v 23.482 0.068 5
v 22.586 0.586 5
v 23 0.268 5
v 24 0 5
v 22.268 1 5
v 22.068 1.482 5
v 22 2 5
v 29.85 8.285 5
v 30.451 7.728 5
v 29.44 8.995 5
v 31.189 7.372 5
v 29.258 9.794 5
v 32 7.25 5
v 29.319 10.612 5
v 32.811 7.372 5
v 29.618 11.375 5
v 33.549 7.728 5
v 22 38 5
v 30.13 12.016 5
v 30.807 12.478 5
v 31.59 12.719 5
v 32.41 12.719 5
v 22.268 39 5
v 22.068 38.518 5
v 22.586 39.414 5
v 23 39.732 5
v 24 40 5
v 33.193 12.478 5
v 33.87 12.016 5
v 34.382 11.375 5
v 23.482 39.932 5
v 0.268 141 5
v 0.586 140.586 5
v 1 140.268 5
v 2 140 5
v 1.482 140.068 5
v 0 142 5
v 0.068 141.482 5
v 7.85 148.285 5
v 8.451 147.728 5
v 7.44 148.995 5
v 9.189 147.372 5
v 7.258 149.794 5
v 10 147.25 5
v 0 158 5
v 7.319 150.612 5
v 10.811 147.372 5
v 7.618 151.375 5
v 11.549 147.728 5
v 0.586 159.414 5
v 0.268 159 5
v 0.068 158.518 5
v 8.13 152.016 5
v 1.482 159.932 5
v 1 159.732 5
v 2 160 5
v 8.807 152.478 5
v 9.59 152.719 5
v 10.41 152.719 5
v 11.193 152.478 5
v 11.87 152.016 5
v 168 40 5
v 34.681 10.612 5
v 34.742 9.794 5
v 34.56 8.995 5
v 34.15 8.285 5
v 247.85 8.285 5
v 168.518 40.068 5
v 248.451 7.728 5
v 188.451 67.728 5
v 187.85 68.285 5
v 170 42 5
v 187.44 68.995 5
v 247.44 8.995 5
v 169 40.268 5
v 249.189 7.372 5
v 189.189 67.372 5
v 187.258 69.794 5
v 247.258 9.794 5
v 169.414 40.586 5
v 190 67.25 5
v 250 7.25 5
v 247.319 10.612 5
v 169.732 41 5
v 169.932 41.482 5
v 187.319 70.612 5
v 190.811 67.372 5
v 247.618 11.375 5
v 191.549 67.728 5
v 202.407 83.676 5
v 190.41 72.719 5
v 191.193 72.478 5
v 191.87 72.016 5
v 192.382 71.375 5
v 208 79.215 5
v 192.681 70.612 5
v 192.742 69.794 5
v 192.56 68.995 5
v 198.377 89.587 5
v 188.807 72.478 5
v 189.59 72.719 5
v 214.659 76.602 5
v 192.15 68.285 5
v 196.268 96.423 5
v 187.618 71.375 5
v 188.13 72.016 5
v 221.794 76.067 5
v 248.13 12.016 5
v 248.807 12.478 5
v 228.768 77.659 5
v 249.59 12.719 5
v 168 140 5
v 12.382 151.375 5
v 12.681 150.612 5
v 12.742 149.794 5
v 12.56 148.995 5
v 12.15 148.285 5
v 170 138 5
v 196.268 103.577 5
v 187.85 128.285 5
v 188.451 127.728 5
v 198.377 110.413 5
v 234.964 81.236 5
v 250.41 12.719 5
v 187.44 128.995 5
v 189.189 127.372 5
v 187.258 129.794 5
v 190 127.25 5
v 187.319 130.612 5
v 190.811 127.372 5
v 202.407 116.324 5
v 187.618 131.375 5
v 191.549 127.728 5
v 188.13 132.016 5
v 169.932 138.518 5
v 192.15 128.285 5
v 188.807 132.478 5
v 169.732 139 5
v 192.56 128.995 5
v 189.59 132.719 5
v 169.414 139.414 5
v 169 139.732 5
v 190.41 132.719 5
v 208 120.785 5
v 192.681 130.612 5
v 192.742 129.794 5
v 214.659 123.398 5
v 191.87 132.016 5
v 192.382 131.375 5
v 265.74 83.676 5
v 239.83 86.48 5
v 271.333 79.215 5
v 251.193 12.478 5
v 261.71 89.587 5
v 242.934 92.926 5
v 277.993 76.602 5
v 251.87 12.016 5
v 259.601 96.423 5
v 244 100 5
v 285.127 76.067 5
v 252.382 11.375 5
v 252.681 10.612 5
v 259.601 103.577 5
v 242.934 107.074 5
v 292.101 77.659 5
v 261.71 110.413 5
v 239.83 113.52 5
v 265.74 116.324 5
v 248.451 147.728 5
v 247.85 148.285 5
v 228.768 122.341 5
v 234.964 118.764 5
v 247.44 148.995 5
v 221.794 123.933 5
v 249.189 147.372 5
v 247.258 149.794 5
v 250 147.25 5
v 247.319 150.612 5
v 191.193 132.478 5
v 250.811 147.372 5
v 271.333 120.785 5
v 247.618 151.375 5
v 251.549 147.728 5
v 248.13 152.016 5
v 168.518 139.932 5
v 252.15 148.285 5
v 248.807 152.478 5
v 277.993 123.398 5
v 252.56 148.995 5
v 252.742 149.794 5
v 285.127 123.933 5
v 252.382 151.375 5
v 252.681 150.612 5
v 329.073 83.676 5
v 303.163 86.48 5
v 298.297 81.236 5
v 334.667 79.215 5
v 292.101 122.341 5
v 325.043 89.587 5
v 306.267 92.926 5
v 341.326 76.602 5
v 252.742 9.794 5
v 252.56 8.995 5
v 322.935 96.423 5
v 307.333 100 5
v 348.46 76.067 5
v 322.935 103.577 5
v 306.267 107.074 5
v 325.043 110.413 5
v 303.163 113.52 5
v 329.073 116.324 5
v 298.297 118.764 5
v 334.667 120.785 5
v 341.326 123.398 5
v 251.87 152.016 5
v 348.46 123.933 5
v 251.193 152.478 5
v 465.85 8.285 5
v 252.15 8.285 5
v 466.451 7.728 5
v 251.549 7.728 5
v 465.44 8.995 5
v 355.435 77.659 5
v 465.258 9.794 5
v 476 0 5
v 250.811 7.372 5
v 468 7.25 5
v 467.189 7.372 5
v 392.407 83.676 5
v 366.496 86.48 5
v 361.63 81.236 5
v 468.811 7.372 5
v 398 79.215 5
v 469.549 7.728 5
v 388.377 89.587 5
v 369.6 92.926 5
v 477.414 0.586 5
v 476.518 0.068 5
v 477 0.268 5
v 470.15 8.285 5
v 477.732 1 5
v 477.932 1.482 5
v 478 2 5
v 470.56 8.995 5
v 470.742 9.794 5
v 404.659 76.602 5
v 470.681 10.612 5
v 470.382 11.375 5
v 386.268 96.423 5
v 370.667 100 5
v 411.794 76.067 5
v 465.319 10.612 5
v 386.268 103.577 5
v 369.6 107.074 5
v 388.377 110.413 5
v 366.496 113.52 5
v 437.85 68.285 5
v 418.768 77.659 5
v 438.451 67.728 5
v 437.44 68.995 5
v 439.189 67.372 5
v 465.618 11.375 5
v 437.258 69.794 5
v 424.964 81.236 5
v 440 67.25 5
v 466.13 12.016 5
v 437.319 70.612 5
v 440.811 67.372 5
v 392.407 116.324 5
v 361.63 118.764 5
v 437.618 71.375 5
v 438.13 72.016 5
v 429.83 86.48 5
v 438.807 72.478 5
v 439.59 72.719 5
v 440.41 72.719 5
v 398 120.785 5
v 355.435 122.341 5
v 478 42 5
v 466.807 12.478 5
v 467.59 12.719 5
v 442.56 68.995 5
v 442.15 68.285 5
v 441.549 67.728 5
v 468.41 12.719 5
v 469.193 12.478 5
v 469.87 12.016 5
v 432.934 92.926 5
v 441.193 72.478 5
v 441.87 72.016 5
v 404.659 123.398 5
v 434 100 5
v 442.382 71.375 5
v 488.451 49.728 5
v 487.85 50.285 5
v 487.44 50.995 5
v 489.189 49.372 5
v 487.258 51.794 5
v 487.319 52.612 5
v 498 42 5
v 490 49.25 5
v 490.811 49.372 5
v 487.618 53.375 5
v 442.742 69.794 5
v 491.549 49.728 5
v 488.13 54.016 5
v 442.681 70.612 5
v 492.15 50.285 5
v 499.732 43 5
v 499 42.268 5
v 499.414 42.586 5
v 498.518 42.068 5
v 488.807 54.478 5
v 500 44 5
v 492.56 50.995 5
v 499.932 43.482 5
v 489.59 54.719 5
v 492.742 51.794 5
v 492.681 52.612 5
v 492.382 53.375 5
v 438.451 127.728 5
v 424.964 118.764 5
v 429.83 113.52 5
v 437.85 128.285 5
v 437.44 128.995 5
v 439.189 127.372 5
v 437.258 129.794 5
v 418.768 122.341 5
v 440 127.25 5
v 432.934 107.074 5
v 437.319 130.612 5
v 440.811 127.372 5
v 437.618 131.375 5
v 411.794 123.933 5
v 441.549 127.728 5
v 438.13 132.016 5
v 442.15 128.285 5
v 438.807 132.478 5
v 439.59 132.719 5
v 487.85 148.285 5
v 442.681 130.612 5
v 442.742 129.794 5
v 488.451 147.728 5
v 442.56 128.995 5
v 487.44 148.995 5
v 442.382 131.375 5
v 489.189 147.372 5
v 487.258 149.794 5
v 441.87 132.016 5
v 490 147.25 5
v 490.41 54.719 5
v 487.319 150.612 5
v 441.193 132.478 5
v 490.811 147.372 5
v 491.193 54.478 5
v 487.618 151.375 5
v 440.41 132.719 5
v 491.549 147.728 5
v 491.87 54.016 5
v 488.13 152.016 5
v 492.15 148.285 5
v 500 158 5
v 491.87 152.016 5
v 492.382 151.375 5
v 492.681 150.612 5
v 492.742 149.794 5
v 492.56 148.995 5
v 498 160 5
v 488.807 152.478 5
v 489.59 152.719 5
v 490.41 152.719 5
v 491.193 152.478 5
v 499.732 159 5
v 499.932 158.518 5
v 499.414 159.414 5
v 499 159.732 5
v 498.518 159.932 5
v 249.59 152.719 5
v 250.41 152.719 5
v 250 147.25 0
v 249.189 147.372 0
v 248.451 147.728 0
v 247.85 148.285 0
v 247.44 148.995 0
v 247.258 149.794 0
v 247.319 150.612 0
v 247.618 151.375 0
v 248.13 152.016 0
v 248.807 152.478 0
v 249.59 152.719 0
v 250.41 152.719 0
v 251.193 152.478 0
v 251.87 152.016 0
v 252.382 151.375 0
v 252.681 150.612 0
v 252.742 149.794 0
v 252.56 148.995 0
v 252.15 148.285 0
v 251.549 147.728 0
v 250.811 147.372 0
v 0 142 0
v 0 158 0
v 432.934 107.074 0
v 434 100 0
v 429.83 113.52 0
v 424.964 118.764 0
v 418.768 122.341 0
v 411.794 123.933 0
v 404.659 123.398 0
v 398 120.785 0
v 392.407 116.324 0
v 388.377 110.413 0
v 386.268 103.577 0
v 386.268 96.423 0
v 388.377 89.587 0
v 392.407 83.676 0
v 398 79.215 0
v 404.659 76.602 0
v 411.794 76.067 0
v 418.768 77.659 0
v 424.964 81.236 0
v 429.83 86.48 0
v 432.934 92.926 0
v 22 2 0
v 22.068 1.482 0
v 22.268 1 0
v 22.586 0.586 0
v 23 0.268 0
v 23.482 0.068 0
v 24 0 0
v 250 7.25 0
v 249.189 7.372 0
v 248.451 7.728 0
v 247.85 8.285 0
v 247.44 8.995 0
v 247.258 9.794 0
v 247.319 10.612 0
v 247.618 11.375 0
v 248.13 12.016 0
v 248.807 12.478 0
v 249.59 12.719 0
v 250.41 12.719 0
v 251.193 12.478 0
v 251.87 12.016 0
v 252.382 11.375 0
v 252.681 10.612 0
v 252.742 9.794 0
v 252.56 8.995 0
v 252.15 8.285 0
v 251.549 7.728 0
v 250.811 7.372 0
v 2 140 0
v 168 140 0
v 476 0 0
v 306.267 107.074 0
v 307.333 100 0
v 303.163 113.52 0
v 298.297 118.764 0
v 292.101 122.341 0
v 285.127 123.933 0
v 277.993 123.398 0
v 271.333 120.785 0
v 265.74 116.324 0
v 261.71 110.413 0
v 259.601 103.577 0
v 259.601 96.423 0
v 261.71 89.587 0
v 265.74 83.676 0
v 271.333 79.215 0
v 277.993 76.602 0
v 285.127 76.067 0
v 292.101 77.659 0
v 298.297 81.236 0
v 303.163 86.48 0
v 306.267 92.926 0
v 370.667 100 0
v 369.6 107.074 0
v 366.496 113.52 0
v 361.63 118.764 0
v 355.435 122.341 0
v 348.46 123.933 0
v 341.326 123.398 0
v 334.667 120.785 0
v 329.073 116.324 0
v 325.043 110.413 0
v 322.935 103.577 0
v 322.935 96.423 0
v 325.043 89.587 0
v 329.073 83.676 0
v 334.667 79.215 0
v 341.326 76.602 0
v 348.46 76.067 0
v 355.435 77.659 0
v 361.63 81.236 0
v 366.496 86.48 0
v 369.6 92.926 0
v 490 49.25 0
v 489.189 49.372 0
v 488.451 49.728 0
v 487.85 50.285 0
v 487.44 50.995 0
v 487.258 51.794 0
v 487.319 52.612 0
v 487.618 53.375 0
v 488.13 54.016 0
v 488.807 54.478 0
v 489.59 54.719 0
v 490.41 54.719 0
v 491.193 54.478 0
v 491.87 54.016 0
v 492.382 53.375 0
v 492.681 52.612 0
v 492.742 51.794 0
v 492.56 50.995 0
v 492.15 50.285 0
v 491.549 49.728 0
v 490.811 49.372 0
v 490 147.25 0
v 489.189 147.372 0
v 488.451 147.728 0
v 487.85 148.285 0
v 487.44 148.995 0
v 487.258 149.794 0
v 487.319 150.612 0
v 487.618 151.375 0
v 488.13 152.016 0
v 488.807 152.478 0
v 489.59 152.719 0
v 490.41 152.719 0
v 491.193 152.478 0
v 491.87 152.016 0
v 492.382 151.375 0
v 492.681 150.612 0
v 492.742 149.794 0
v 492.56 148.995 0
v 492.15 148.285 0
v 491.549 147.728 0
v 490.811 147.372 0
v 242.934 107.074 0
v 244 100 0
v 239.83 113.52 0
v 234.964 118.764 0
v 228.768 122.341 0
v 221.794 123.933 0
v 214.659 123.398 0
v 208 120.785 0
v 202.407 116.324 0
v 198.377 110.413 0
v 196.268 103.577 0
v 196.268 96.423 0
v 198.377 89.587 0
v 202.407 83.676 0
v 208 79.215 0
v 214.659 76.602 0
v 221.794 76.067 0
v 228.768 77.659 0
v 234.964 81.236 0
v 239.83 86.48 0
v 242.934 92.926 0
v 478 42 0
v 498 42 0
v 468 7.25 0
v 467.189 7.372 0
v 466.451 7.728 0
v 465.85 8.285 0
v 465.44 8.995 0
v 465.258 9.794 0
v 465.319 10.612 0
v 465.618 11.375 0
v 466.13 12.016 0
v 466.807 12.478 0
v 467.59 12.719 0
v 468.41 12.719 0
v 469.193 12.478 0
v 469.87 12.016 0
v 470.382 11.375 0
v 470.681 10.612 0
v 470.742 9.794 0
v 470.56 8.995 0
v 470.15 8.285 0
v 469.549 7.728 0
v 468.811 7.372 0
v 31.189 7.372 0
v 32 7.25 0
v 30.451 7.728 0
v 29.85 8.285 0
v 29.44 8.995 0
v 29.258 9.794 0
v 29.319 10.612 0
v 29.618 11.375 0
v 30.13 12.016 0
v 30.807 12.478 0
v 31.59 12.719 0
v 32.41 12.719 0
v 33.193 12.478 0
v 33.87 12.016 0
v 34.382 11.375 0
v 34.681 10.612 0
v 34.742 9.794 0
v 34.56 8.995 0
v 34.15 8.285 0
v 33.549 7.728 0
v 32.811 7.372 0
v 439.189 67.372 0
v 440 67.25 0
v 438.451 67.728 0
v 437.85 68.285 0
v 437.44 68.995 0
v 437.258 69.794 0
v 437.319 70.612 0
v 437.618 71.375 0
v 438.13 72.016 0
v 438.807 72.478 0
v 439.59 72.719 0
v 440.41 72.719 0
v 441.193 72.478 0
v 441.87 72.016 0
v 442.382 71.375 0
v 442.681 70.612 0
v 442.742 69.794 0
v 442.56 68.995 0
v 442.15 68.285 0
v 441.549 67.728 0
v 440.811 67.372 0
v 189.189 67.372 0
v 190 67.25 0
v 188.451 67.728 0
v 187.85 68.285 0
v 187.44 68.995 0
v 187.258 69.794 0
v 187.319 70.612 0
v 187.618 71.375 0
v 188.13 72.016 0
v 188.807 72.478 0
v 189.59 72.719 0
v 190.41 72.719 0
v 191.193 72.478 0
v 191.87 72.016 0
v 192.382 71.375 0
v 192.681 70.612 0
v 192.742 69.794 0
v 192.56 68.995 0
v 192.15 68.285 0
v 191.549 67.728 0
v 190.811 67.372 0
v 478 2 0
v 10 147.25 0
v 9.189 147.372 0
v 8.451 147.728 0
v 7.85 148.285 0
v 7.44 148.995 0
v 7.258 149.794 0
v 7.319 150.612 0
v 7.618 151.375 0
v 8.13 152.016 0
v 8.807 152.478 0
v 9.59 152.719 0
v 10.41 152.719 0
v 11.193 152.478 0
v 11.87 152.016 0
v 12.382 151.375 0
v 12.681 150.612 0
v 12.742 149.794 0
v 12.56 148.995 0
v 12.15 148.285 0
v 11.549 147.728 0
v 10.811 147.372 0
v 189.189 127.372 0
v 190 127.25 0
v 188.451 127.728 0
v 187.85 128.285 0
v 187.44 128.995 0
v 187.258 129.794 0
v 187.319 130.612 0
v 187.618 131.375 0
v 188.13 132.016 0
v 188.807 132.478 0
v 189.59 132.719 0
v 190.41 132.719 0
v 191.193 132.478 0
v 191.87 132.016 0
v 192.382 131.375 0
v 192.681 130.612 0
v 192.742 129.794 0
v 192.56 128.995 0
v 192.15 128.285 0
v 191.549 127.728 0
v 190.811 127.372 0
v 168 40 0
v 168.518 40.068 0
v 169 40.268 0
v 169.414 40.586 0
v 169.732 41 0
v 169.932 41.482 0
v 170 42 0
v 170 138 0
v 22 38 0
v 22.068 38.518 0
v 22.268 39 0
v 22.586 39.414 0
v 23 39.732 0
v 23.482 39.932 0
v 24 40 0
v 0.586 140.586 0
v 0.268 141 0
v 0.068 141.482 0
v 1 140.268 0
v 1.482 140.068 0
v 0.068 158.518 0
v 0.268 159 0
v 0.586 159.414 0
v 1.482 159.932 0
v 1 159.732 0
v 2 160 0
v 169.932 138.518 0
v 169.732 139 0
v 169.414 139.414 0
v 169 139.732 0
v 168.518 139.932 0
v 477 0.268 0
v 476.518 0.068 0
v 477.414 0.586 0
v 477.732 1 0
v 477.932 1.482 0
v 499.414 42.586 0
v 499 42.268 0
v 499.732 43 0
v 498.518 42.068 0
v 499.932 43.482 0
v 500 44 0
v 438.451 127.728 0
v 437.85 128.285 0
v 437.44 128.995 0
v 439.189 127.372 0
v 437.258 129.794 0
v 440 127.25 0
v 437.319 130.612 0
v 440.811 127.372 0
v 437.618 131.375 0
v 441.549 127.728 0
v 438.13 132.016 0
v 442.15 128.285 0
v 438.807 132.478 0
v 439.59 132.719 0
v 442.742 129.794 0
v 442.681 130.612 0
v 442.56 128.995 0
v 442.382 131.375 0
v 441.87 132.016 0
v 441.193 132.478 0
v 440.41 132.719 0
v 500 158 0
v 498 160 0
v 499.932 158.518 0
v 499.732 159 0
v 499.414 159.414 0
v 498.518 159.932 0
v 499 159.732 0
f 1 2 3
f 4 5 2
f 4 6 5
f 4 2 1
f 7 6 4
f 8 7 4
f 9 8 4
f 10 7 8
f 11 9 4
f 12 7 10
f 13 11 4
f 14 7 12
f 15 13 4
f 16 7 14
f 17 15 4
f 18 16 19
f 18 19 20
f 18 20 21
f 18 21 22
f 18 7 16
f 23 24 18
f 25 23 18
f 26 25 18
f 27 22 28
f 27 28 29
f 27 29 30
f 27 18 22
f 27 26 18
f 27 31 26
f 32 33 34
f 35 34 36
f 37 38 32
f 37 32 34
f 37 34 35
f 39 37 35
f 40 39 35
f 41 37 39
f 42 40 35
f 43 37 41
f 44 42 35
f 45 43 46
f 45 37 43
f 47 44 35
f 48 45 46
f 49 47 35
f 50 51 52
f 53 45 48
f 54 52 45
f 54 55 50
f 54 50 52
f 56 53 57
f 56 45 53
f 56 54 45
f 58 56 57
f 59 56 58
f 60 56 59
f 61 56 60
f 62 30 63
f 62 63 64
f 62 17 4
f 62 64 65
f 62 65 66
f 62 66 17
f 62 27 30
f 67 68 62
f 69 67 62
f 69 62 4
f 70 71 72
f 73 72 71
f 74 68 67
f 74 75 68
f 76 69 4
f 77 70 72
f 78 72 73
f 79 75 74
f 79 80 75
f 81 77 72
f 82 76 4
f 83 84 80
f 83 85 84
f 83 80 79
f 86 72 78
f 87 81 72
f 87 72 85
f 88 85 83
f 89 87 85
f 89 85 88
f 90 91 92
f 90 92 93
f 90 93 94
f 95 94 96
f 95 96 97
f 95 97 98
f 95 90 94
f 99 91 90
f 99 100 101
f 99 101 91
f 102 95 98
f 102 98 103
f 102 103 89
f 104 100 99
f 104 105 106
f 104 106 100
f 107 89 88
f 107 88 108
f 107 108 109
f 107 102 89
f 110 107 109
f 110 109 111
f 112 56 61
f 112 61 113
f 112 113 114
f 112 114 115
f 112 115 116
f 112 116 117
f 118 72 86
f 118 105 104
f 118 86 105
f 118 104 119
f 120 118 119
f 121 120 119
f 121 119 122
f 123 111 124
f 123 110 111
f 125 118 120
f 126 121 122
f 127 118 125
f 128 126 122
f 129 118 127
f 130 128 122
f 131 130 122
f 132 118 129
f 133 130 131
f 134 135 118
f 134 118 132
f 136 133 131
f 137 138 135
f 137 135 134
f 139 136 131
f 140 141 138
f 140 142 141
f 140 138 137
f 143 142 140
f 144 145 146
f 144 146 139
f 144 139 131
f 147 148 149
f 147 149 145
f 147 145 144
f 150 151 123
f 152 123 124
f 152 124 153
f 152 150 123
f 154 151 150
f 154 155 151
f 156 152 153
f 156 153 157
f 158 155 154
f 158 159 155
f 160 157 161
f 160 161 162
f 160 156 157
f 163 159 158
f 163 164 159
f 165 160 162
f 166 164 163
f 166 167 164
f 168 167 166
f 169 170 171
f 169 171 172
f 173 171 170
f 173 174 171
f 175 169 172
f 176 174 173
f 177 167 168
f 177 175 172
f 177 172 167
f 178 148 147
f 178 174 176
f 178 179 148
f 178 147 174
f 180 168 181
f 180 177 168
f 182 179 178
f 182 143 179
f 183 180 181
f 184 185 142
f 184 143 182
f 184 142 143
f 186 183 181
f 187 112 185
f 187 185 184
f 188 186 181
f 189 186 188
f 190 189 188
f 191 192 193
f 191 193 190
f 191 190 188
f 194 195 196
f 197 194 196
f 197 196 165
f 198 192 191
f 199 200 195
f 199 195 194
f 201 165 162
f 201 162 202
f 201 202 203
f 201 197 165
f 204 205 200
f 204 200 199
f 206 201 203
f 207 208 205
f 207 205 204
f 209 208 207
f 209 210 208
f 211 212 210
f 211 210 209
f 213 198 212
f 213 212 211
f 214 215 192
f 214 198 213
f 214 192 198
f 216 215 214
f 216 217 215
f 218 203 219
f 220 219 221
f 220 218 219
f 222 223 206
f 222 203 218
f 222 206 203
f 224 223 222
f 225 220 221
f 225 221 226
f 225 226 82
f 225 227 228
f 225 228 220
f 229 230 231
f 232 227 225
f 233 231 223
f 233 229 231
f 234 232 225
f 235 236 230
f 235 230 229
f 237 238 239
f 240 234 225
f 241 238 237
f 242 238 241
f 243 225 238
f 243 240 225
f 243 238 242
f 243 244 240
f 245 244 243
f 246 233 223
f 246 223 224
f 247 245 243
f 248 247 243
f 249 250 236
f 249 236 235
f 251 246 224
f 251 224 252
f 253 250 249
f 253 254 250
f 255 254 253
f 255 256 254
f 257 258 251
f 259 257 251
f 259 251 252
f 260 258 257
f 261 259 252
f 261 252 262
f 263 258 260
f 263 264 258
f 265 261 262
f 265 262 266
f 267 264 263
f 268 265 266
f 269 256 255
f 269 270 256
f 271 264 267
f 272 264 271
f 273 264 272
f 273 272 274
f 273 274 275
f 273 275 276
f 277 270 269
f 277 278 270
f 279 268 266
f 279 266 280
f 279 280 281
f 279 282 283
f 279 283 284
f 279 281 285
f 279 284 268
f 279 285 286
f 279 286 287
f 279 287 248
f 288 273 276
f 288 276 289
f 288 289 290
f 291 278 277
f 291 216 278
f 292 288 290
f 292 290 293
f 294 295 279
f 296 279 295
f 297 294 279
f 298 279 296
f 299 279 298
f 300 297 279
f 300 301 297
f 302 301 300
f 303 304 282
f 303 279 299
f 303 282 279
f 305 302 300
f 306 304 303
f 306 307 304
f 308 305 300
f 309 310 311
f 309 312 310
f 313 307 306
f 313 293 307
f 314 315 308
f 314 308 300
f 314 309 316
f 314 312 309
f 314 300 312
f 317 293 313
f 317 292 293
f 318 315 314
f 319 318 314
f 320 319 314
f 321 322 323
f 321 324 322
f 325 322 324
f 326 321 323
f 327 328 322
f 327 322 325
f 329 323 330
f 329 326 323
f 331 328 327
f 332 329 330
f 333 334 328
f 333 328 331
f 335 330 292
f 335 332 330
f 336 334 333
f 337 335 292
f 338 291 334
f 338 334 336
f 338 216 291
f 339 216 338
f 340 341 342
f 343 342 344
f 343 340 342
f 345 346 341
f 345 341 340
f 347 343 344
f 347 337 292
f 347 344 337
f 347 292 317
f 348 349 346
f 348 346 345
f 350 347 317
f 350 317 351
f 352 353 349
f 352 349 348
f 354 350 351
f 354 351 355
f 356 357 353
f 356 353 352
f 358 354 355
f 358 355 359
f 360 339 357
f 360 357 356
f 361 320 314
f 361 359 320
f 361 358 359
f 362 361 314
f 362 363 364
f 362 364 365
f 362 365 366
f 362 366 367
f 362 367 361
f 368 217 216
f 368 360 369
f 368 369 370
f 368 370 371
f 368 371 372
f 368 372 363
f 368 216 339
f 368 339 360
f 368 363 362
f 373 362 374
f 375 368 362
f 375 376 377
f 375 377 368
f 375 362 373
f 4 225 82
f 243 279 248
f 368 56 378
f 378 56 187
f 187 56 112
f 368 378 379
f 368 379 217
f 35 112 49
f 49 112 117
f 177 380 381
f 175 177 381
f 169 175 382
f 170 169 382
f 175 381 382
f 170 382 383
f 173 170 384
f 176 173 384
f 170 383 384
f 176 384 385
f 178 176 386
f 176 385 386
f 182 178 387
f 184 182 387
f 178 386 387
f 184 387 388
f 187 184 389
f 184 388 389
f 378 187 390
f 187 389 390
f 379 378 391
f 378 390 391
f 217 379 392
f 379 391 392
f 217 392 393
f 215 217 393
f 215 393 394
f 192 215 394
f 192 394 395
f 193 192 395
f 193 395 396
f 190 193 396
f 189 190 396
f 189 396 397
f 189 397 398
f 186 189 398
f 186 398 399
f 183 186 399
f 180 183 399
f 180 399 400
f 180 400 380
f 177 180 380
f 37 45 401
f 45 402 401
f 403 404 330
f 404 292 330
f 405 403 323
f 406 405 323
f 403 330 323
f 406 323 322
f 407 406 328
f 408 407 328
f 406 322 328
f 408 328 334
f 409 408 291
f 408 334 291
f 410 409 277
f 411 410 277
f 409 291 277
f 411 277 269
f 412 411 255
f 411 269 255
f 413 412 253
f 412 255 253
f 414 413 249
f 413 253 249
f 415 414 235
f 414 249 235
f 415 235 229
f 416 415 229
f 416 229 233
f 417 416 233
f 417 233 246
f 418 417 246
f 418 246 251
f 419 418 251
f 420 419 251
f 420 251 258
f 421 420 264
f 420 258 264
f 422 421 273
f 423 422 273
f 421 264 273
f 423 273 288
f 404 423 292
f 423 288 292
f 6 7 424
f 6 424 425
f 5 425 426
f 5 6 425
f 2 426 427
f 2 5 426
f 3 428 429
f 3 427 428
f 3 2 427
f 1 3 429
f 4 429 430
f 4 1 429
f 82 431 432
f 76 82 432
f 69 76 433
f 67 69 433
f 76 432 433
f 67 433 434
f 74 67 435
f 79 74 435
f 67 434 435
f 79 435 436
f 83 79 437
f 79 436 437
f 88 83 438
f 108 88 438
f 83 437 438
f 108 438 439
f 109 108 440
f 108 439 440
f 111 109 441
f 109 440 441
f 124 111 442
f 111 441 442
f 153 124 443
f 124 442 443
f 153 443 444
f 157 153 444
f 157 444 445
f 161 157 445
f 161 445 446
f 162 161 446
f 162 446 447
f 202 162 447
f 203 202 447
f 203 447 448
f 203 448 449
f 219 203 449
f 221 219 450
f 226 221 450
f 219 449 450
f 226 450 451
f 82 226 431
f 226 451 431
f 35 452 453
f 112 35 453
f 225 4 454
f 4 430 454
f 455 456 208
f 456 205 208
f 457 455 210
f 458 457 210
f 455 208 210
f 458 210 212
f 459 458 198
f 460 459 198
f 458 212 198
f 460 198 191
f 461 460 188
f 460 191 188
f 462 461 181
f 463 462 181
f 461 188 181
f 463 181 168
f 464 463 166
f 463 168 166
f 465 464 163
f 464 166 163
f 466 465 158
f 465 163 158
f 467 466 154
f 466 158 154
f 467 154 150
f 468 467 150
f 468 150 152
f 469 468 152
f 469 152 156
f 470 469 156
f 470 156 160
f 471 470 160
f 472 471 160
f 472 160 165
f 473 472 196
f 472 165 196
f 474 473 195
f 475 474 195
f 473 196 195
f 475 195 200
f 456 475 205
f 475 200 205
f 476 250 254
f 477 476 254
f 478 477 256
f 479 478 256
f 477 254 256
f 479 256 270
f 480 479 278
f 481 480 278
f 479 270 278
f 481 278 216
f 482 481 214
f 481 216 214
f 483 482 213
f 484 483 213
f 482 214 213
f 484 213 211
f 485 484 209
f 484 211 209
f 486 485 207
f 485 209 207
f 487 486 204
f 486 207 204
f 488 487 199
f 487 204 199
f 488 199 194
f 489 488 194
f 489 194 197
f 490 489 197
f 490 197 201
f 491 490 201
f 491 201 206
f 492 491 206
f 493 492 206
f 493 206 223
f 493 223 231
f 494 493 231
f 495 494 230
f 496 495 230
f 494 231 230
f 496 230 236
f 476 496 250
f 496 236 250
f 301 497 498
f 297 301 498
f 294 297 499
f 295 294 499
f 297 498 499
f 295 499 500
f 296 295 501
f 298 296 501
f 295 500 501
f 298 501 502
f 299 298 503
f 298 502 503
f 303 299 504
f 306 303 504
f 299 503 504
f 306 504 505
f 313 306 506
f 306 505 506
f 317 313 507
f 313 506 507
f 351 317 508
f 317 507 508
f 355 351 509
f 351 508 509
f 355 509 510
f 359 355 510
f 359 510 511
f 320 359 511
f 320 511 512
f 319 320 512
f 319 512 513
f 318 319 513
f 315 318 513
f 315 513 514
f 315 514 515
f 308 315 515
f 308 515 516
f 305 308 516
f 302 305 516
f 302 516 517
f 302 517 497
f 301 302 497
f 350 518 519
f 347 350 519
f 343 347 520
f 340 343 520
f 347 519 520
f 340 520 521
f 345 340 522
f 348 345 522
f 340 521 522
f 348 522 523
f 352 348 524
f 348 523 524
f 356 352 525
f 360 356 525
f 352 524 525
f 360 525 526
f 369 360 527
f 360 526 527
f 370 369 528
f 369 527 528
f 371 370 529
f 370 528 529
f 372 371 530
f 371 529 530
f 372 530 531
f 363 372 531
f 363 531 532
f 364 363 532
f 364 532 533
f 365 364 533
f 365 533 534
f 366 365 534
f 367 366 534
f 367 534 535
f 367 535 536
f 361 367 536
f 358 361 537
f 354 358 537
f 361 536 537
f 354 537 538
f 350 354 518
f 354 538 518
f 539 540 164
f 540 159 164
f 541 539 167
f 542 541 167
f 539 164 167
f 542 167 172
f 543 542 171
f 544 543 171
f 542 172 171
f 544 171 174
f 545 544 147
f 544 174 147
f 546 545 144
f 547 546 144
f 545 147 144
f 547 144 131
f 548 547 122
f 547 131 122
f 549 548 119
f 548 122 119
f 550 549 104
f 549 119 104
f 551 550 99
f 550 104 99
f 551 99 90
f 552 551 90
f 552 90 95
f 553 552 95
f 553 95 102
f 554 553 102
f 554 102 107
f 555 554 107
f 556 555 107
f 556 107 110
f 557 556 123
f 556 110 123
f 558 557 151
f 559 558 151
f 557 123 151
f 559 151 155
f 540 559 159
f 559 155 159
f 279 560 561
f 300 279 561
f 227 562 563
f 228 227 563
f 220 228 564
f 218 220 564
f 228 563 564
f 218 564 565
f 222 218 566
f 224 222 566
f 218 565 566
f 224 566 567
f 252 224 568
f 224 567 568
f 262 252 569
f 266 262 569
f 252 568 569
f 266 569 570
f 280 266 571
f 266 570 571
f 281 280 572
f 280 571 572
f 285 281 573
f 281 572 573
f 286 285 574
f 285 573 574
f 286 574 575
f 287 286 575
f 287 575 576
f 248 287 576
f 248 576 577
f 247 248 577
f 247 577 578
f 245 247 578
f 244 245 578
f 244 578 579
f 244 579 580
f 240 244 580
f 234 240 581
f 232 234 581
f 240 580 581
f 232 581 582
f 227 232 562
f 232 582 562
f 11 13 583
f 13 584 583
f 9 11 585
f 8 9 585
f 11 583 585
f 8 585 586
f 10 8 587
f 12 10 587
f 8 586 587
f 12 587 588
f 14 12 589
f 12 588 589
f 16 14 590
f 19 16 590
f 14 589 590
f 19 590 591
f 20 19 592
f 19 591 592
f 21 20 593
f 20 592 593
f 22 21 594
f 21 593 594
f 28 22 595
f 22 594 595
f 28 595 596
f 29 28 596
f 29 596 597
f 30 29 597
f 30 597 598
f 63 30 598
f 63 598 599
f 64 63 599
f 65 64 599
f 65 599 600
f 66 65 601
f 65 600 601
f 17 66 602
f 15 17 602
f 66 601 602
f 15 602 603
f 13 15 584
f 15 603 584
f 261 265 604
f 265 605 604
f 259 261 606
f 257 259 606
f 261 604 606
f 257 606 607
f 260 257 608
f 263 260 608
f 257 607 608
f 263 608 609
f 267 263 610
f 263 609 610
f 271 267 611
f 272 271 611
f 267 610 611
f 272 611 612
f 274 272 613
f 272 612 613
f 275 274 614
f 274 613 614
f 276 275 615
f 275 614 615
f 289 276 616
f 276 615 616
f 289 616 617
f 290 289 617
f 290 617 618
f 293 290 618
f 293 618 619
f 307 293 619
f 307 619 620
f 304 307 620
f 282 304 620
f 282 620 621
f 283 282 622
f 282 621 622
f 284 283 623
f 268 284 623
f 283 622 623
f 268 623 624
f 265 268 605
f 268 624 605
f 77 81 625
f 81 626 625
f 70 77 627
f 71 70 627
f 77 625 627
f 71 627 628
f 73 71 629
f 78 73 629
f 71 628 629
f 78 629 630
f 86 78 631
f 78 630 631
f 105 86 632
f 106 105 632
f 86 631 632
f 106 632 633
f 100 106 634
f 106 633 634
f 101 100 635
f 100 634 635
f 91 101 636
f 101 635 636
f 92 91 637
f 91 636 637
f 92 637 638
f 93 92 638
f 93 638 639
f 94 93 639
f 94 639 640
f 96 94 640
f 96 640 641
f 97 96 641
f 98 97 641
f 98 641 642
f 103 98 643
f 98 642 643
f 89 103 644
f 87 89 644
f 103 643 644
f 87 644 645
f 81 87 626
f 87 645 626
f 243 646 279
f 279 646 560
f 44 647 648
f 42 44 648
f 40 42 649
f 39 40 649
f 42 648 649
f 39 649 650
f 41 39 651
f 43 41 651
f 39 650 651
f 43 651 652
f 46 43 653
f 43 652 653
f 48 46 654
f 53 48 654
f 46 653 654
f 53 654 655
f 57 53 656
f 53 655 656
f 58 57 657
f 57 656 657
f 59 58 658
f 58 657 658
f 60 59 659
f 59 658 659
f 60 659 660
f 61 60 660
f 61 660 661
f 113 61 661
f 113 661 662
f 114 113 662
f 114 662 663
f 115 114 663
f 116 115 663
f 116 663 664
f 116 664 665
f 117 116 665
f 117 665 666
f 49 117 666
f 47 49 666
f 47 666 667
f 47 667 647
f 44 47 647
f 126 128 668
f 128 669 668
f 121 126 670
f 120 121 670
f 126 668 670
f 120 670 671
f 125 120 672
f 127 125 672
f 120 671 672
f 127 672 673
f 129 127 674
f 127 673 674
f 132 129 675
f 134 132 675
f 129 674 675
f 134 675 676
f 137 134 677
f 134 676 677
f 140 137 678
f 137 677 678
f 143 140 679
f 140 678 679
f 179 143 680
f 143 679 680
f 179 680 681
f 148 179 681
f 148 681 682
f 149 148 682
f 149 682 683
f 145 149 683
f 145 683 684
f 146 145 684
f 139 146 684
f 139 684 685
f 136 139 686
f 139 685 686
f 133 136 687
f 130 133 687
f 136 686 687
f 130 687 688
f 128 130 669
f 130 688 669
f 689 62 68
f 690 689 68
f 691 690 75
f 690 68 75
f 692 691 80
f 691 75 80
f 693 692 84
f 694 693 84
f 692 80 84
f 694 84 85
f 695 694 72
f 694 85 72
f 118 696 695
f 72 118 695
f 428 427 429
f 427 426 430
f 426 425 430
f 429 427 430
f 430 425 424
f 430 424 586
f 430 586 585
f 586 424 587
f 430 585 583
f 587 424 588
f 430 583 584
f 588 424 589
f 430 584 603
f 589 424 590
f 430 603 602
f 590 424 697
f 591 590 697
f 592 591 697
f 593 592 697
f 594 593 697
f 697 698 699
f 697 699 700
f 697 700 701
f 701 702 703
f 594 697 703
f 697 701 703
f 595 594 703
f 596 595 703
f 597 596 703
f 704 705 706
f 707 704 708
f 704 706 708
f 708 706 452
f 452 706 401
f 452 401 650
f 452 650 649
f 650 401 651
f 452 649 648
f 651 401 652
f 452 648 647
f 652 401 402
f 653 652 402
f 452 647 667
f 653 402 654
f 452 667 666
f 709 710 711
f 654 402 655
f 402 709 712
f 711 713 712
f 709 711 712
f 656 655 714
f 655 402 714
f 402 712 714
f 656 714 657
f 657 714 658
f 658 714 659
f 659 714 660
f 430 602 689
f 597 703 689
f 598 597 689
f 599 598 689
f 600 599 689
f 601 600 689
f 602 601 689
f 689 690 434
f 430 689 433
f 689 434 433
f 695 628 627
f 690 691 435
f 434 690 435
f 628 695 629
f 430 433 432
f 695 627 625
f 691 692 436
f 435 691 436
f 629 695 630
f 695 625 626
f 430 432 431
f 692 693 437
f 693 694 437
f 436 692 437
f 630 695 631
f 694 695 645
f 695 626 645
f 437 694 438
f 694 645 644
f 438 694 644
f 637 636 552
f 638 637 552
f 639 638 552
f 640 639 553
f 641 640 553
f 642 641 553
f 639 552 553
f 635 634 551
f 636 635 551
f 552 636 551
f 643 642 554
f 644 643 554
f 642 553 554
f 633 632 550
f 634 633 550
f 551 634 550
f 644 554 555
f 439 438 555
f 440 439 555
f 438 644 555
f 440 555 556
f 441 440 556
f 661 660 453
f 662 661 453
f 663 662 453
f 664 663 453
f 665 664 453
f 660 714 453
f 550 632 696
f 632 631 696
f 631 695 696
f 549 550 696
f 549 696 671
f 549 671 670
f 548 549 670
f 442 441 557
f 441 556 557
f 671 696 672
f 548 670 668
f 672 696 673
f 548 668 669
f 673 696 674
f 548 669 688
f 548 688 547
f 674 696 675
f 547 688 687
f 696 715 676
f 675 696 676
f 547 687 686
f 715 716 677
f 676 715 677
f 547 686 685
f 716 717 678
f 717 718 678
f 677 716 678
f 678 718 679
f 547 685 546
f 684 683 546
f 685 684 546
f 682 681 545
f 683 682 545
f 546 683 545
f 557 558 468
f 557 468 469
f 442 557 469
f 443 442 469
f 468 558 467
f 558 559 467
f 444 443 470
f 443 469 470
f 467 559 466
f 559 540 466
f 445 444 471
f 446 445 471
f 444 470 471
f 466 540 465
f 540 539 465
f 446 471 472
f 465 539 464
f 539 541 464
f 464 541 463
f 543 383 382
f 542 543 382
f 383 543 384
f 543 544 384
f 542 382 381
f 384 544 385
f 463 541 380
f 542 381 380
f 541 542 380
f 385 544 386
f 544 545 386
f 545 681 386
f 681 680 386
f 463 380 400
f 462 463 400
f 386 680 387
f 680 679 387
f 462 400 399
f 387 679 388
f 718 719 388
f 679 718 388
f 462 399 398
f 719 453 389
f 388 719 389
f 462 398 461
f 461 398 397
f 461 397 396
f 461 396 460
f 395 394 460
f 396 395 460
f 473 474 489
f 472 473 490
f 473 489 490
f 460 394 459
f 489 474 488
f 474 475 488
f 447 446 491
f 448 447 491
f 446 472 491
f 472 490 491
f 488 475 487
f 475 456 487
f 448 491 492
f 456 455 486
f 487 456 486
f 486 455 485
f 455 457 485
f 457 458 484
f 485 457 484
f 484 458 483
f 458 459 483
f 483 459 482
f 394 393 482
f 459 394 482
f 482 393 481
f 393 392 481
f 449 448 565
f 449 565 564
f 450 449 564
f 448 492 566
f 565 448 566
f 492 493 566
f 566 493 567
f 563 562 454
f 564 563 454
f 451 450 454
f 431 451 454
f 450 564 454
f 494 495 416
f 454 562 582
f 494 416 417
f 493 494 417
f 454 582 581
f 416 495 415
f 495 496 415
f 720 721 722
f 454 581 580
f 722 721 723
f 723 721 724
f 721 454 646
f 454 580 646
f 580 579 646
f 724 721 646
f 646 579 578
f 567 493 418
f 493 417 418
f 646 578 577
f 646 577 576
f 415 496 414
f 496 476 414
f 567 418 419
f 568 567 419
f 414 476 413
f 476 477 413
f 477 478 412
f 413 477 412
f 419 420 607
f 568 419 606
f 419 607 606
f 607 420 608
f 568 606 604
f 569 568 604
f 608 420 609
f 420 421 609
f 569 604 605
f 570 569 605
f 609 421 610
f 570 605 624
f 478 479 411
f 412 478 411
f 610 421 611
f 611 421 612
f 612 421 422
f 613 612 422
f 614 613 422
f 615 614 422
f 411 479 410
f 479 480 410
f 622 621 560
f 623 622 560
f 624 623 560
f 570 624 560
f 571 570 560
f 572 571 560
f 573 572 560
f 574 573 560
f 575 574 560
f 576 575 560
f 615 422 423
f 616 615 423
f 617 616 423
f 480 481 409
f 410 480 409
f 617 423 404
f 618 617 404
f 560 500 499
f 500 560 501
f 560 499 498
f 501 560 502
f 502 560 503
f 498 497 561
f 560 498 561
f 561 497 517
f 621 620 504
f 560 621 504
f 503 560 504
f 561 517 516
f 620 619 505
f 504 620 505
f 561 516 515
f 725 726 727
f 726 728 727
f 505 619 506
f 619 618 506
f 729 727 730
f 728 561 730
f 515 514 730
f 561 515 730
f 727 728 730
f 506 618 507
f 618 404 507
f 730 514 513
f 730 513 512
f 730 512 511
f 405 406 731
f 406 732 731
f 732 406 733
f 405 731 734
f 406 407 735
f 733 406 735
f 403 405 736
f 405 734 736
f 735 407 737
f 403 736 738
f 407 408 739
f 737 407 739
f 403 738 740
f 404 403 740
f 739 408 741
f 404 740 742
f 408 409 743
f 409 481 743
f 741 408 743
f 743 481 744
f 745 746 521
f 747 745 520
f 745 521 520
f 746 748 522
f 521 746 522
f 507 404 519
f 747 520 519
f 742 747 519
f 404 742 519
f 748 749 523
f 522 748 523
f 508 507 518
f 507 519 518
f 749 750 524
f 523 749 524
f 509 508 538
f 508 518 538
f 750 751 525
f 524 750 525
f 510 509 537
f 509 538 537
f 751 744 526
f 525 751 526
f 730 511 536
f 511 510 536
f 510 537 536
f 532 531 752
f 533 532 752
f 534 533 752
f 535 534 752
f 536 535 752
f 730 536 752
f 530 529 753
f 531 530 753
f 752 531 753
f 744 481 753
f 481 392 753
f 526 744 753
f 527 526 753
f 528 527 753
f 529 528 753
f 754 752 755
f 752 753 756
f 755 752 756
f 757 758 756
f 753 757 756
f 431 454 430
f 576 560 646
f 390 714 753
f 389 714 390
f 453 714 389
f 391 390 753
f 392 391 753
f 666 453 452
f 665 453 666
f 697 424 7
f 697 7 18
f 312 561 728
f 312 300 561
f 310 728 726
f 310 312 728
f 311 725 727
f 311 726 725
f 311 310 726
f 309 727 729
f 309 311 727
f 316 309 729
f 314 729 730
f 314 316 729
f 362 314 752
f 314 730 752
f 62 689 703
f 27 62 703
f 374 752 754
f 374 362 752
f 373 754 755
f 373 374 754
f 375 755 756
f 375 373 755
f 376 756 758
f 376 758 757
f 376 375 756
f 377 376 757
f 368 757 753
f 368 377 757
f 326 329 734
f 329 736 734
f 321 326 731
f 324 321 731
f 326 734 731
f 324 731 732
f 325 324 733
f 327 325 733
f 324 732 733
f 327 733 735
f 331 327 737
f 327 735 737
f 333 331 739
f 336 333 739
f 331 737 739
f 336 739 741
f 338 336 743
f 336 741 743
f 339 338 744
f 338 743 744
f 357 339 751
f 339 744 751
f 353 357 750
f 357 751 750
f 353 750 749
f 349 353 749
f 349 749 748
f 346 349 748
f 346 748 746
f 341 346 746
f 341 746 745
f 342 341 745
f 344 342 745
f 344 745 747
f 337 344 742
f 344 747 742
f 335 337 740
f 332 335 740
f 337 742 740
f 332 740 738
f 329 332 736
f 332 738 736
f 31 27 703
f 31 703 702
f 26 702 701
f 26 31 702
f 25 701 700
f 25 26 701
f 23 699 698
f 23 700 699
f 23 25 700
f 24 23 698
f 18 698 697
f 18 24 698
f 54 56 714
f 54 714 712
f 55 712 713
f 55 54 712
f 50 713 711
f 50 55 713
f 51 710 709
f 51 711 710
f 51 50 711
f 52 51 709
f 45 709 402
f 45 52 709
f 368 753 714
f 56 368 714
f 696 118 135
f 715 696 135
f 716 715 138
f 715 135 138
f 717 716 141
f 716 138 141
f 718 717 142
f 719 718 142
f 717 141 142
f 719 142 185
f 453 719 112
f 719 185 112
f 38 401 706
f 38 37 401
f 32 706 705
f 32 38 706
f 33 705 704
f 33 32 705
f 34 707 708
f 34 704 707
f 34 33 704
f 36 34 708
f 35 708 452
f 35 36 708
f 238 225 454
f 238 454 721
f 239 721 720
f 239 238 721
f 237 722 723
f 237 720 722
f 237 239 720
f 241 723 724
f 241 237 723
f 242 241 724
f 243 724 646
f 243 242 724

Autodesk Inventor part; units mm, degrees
ref_plane "YZ Plane" through (0, 0, 0) normal (1, 0, 0) x (0, 1, 0)
ref_plane "XZ Plane" through (0, 0, 0) normal (0, 1, 0) x (-1, 0, 0)
ref_plane "XY Plane" through (0, 0, 0) normal (0, 0, 1) x (1, 0, 0)
sketch "Sketch1" plane through (0, 0, 0) normal (0, 0, 1) x (1, 0, 0)
  line L0 (500, 160) -> (0, 160)
  line L1 (0, 160) -> (0, 140)
  line L2 (478, 0) -> (478, 42)
  line L3 (478, 42) -> (500, 42)
  line L4 (500, 42) -> (500, 160)
  line L5 (0, 0) -> (22, 0)
  line L6 (22, 0) -> (22, 40)
  line L7 (22, 0) -> (478, 0)
  line L8 (0, 42) -> (0, 0)
  line L9 (0, 140) -> (170, 140)
  line L10 (170, 140) -> (170, 40)
  line L11 (170, 40) -> (22, 40)
  line L12 (0, 56) -> (0, 42)
  dimension "d1" = 500
  dimension "d6" = 22
  dimension "d46" = 42
  dimension "d47" = 160
  dimension "d52" = 20
  dimension "d53" = 170
  dimension "d54" = 40
extrude "Extrusion1" add sketch "Sketch1" along normal blind 5
sketch "Sketch2" plane through (0, 0, 5) normal (0, 0, 1) x (1, 0, 0)
  circle A0 centre (32, 10) radius 2.75
  circle A1 centre (468, 10) radius 2.75
  circle A2 centre (10, 150) radius 2.75
  circle A3 centre (490, 150) radius 2.75
  circle A4 centre (490, 52) radius 2.75
  line L0 (500, 160) -> (0, 160) projected
  line L1 (500, 42) -> (500, 160) projected
  line L2 (478, 42) -> (500, 42) projected
  line L3 (478, 0) -> (478, 42) projected
  circle A5 centre (190, 130) radius 3.25
  circle A6 centre (440, 130) radius 3.25
  circle A7 centre (190, 70) radius 3.25
  circle A8 centre (440, 70) radius 3.25
  line L4 (0, 160) -> (0, 140) projected
  line L5 (22, 0) -> (478, 0) projected
  line L6 (22, 40) -> (22, 0) projected
  circle A9 centre (250, 150) radius 2.75
  circle A10 centre (250, 10) radius 2.75
  dimension "d9" = 5.5
  dimension "d10" = 10
  dimension "d12" = 10
  dimension "d13" = 10
  dimension "d14" = 10
  dimension "d15" = 10
  dimension "d16" = 10
  dimension "d20" = 5.5
  dimension "d21" = 5.5
  dimension "d22" = 5.5
  dimension "d23" = 5.5
  dimension "d34" = 60
  dimension "d35" = 60
  dimension "d38" = 30
  dimension "d39" = 6.5
  dimension "d40" = 6.5
  dimension "d41" = 6.5
  dimension "d42" = 6.5
  dimension "d43" = 30
  dimension "d55" = 70
  dimension "d56" = 190
  dimension "d57" = 190
  dimension "d58" = 10
  dimension "d59" = 10
  dimension "d60" = 10
  dimension "d61" = 10
  dimension "d62" = 70
  dimension "d63" = 10
  dimension "d64" = 10
  dimension "d65" = 5.5
  dimension "d66" = 5.5
  dimension "d67" = 250
  dimension "d68" = 250
fillet "Fillet1" radius 2 9 edges at (500, 160, 2.5) (500, 42, 2.5) (0, 160, 2.5) (478, 0, 2.5) (22, 0, 2.5) (22, 40, 2.5) (0, 140, 2.5) (170, 140, 2.5) (170, 40, 2.5)
hole "Hole6" at (10, 150, 5) at (250, 150, 5) at (490, 150, 5) at (490, 52, 5) at (468, 10, 5) at (250, 10, 5) at (32, 10, 5) at (190, 130, 5) at (190, 70, 5) at (440, 130, 5) at (440, 70, 5) direction (0, 0, -1) diameter 5.5 end through all
sketch "Sketch4" plane through (0, 0, 5) normal (0, 0, 1) x (1, 0, 0)
  circle A0 centre (220, 100) radius 24
  circle A1 centre (283.3333, 100) radius 24
  circle A2 centre (346.6667, 100) radius 24
  circle A3 centre (410, 100) radius 24
  circle A4 centre (190, 130) radius 2.75 projected
  line L0 (207.2246, 100) -> (486.1087, 100) construction
  point P0 (0, 0)
  dimension "d115" = 30
  dimension "d116" = 30
  dimension "d117" = 63.3333
  dimension "d118" = 63.3333
  dimension "d119" = 63.3333
  dimension "d120" = 48
  dimension "d121" = 48
  dimension "d122" = 48
  dimension "d123" = 48
extrude "Extrusion2" cut sketch "Sketch4" against normal blind 10 contours A0 | A1 | A2 | A3
equation "\"d12\" = d10"
equation "\"d13\" = d10"
equation "\"d14\" = d10"
equation "\"d15\" = d10"
equation "\"d16\" = d10"
equation "\"d20\" = d9"
equation "\"d21\" = d9"
equation "\"d22\" = d9"
equation "\"d23\" = d9"
equation "\"d35\" = d34"
equation "\"d40\" = d39"
equation "\"d41\" = d39"
equation "\"d42\" = d39"
equation "\"d43\" = d38"
equation "\"d57\" = d56"
equation "\"d58\" = d10"
equation "\"d59\" = d10"
equation "\"d60\" = d10"
equation "\"d61\" = d10"
equation "\"d62\" = d55"
equation "\"d63\" = d10"
equation "\"d64\" = d10"
equation "\"d65\" = d9"
equation "\"d66\" = d9"
equation "\"d68\" = d67"
equation "\"d97\" = d9"
equation "\"d118\" = d117"
equation "\"d119\" = d117"
equation "\"d121\" = d120"
equation "\"d122\" = d120"
equation "\"d123\" = d120"
properties part number "BasePlate"
